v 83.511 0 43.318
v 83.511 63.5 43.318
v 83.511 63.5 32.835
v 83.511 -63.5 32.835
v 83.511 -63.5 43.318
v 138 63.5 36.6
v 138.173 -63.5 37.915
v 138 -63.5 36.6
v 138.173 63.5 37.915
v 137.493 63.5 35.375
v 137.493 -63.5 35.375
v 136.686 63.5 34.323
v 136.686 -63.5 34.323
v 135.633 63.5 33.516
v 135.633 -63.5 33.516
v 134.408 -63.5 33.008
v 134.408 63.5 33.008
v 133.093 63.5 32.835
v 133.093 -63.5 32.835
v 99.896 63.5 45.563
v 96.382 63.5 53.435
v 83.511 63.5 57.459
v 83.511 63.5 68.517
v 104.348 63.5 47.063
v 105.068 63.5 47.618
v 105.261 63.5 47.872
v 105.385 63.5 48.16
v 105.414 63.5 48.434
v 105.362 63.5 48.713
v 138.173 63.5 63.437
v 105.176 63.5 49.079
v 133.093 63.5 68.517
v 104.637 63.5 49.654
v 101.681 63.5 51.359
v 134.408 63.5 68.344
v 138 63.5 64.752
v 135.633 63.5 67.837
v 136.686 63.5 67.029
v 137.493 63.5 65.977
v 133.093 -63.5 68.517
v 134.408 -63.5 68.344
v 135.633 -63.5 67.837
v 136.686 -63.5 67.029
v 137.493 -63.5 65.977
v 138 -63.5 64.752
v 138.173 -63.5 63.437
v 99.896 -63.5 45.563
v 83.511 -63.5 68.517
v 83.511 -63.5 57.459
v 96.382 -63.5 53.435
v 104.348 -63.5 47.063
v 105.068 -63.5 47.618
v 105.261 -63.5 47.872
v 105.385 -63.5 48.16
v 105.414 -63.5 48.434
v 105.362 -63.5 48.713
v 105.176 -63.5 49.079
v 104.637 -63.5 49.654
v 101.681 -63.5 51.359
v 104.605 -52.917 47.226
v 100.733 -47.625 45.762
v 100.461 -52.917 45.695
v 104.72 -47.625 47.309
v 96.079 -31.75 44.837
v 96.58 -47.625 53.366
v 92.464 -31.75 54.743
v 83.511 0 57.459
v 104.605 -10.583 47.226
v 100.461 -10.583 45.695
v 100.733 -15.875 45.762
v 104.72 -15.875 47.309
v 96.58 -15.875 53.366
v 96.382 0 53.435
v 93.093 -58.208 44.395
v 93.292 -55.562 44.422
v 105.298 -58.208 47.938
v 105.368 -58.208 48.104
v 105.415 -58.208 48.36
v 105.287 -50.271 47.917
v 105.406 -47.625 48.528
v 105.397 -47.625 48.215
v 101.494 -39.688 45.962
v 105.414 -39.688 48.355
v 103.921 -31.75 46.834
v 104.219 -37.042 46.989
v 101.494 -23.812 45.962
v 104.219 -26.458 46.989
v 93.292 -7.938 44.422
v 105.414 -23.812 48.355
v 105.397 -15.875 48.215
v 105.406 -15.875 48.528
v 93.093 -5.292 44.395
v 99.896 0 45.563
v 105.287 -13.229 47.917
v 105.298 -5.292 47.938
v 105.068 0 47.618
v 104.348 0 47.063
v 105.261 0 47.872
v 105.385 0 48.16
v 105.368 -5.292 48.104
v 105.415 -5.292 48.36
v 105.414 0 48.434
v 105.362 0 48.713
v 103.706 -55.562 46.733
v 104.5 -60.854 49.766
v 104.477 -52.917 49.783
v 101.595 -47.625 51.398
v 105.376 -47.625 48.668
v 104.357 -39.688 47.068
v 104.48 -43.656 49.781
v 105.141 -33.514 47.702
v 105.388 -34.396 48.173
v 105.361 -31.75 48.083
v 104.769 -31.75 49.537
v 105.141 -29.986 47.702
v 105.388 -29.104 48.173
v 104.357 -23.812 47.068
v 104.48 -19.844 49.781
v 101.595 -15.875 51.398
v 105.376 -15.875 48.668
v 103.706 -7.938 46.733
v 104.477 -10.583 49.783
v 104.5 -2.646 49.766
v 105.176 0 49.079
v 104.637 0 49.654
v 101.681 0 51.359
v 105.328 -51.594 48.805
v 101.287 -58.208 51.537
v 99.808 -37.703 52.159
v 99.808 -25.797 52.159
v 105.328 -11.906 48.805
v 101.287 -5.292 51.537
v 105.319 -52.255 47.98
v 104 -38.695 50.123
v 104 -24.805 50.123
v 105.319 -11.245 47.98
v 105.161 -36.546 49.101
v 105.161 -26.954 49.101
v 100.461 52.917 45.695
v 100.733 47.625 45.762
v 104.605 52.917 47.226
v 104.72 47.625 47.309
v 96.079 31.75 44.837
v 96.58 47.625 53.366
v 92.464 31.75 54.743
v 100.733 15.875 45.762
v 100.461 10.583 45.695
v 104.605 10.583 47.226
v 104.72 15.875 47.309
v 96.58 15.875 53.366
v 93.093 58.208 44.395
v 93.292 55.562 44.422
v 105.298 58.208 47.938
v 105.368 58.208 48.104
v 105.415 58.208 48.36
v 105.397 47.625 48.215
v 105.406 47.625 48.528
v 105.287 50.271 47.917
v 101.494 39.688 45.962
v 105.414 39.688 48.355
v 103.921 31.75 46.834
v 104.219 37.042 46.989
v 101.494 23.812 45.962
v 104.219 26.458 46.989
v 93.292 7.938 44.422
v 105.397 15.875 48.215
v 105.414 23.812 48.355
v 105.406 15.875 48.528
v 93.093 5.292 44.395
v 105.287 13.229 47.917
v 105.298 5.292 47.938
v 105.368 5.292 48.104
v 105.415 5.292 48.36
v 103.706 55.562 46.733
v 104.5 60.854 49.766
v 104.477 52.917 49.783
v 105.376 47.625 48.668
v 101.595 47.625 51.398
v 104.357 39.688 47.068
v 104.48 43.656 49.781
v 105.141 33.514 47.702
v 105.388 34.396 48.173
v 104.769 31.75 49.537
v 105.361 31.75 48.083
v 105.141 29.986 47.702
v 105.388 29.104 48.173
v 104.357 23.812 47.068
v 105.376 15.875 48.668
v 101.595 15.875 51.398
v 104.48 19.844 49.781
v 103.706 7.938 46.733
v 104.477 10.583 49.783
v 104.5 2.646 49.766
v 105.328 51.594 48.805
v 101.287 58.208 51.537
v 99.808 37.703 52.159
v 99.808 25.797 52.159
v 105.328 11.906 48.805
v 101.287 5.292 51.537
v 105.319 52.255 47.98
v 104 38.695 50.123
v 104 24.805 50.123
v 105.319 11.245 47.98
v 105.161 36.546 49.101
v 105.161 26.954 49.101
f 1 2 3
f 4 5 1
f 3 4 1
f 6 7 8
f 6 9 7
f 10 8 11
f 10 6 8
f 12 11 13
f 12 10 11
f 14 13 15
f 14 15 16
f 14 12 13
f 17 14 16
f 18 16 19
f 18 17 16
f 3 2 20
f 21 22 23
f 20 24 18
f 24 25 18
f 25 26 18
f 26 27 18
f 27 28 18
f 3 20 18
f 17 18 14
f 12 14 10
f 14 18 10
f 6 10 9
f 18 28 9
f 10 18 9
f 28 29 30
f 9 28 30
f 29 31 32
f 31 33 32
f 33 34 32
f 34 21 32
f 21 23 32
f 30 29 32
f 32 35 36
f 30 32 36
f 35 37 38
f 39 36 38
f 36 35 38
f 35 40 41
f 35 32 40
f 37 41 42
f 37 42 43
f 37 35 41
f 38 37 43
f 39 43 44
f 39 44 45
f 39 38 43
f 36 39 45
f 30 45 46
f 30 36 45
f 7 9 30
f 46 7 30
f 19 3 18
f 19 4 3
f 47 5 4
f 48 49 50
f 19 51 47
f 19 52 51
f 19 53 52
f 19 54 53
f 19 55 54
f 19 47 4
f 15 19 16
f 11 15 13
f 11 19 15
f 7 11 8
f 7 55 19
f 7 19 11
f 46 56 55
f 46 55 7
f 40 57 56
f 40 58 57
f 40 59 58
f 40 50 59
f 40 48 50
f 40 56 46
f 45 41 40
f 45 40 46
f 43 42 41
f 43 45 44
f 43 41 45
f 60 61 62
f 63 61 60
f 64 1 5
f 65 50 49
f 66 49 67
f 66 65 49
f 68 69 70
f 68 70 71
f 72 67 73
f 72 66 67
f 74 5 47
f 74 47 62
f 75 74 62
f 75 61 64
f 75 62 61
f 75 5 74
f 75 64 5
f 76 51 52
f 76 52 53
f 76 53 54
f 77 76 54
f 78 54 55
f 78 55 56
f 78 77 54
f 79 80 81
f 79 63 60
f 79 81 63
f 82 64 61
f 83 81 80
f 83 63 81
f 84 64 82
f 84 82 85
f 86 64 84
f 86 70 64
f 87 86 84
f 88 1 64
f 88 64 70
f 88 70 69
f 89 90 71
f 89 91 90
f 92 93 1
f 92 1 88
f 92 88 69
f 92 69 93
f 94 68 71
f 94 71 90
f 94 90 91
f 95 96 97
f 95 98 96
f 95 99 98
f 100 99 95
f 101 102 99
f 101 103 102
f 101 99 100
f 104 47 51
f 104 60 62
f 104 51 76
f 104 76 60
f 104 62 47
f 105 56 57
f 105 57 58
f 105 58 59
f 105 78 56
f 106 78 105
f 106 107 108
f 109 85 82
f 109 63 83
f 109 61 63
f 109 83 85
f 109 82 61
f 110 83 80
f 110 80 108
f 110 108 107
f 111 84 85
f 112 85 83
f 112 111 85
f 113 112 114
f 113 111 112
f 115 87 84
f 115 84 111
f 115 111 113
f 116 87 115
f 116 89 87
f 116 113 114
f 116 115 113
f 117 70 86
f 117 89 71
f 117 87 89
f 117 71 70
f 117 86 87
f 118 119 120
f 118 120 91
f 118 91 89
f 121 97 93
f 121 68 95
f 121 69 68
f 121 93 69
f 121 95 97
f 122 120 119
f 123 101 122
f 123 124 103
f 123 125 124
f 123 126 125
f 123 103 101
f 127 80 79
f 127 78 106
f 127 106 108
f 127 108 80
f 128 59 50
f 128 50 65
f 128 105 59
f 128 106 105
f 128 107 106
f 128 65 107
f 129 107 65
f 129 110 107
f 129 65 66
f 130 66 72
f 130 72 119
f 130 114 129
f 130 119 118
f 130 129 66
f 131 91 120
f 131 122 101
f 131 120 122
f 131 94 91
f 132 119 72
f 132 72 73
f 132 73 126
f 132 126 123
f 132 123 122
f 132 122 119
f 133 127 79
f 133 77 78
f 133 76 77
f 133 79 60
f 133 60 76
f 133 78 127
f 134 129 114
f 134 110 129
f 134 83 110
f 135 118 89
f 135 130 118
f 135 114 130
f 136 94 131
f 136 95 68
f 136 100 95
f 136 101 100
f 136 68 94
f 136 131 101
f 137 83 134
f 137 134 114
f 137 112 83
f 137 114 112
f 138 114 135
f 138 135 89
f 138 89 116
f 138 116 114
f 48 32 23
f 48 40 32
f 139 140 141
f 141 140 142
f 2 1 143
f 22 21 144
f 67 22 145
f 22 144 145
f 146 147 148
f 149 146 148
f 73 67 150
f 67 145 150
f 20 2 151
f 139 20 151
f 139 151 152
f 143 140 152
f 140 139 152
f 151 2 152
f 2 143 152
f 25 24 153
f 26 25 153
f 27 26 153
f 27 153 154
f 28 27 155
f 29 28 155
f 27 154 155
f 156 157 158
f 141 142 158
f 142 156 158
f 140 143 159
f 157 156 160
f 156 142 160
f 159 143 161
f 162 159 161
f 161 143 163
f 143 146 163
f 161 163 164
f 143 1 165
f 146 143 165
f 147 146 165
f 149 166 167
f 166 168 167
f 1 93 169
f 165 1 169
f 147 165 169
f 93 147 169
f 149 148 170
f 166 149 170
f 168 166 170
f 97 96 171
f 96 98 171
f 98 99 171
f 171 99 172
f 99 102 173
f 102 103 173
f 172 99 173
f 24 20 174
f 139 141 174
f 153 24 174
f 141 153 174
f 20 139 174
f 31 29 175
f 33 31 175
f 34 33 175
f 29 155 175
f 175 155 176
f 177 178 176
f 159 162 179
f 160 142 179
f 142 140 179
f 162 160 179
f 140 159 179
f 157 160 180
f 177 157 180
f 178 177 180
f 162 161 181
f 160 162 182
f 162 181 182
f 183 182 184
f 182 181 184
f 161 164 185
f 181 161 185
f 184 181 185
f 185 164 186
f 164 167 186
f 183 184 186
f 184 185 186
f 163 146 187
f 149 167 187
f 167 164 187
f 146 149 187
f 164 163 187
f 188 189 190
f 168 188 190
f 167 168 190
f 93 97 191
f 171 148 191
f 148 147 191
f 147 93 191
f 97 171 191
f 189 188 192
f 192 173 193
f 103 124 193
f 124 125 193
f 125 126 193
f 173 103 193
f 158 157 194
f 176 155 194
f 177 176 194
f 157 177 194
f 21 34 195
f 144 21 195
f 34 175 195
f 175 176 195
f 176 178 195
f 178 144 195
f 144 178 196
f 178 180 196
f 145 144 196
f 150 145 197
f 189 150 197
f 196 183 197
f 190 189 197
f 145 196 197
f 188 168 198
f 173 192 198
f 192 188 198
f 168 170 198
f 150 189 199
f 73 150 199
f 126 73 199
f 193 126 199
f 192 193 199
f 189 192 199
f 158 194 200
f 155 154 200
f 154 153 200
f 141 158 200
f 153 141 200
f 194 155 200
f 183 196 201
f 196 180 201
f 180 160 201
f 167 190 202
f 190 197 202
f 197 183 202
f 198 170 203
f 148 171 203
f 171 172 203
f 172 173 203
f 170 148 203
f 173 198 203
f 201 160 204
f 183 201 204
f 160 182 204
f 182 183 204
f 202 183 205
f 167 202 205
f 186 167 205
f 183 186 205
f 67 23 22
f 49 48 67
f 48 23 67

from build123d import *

# Parameters (mm, degrees)
F1_DEPTH = 63.5
F2_R     = 5.08


with BuildPart() as f1:
    # F0 (on Front) → F1 (new body, symmetric)
    with BuildSketch(Plane.XZ):
        with BuildLine():
            Line((83.5114195943, 68.5173198581), (83.5114195943, 57.4587951158))
            add(Edge.make_bspline(
                [(83.5114195943, 43.318330771), (97.6864954558, 44.6749269215), (115.7927588569, 47.6601282656), (92.4910106791, 54.8300490471), (83.5114195943, 57.4587951158)],
                knots=[0.069978158, 0.069978158, 0.069978158, 0.069978158, 0.2637100005, 0.4044273301, 0.4044273301, 0.4044273301, 0.4044273301], degree=3))
            Line((83.5114195943, 43.318330771), (83.5114195943, 32.8351669014))
            Line((83.5114195943, 32.8351669014), (138.1734460592, 32.8351669014))
            Line((138.1734460592, 32.8351669014), (138.1734460592, 68.5173198581))
            Line((138.1734460592, 68.5173198581), (83.5114195943, 68.5173198581))
        make_face()
    extrude(amount=F1_DEPTH, both=True)

    # F2
    f2_edges = [f1.edges().sort_by_distance(p)[0] for p in [
        (138.173446, 0, 32.835167),
        (138.173446, 0, 68.51732),
    ]]
    fillet(f2_edges, radius=F2_R)


solid = f1.part
